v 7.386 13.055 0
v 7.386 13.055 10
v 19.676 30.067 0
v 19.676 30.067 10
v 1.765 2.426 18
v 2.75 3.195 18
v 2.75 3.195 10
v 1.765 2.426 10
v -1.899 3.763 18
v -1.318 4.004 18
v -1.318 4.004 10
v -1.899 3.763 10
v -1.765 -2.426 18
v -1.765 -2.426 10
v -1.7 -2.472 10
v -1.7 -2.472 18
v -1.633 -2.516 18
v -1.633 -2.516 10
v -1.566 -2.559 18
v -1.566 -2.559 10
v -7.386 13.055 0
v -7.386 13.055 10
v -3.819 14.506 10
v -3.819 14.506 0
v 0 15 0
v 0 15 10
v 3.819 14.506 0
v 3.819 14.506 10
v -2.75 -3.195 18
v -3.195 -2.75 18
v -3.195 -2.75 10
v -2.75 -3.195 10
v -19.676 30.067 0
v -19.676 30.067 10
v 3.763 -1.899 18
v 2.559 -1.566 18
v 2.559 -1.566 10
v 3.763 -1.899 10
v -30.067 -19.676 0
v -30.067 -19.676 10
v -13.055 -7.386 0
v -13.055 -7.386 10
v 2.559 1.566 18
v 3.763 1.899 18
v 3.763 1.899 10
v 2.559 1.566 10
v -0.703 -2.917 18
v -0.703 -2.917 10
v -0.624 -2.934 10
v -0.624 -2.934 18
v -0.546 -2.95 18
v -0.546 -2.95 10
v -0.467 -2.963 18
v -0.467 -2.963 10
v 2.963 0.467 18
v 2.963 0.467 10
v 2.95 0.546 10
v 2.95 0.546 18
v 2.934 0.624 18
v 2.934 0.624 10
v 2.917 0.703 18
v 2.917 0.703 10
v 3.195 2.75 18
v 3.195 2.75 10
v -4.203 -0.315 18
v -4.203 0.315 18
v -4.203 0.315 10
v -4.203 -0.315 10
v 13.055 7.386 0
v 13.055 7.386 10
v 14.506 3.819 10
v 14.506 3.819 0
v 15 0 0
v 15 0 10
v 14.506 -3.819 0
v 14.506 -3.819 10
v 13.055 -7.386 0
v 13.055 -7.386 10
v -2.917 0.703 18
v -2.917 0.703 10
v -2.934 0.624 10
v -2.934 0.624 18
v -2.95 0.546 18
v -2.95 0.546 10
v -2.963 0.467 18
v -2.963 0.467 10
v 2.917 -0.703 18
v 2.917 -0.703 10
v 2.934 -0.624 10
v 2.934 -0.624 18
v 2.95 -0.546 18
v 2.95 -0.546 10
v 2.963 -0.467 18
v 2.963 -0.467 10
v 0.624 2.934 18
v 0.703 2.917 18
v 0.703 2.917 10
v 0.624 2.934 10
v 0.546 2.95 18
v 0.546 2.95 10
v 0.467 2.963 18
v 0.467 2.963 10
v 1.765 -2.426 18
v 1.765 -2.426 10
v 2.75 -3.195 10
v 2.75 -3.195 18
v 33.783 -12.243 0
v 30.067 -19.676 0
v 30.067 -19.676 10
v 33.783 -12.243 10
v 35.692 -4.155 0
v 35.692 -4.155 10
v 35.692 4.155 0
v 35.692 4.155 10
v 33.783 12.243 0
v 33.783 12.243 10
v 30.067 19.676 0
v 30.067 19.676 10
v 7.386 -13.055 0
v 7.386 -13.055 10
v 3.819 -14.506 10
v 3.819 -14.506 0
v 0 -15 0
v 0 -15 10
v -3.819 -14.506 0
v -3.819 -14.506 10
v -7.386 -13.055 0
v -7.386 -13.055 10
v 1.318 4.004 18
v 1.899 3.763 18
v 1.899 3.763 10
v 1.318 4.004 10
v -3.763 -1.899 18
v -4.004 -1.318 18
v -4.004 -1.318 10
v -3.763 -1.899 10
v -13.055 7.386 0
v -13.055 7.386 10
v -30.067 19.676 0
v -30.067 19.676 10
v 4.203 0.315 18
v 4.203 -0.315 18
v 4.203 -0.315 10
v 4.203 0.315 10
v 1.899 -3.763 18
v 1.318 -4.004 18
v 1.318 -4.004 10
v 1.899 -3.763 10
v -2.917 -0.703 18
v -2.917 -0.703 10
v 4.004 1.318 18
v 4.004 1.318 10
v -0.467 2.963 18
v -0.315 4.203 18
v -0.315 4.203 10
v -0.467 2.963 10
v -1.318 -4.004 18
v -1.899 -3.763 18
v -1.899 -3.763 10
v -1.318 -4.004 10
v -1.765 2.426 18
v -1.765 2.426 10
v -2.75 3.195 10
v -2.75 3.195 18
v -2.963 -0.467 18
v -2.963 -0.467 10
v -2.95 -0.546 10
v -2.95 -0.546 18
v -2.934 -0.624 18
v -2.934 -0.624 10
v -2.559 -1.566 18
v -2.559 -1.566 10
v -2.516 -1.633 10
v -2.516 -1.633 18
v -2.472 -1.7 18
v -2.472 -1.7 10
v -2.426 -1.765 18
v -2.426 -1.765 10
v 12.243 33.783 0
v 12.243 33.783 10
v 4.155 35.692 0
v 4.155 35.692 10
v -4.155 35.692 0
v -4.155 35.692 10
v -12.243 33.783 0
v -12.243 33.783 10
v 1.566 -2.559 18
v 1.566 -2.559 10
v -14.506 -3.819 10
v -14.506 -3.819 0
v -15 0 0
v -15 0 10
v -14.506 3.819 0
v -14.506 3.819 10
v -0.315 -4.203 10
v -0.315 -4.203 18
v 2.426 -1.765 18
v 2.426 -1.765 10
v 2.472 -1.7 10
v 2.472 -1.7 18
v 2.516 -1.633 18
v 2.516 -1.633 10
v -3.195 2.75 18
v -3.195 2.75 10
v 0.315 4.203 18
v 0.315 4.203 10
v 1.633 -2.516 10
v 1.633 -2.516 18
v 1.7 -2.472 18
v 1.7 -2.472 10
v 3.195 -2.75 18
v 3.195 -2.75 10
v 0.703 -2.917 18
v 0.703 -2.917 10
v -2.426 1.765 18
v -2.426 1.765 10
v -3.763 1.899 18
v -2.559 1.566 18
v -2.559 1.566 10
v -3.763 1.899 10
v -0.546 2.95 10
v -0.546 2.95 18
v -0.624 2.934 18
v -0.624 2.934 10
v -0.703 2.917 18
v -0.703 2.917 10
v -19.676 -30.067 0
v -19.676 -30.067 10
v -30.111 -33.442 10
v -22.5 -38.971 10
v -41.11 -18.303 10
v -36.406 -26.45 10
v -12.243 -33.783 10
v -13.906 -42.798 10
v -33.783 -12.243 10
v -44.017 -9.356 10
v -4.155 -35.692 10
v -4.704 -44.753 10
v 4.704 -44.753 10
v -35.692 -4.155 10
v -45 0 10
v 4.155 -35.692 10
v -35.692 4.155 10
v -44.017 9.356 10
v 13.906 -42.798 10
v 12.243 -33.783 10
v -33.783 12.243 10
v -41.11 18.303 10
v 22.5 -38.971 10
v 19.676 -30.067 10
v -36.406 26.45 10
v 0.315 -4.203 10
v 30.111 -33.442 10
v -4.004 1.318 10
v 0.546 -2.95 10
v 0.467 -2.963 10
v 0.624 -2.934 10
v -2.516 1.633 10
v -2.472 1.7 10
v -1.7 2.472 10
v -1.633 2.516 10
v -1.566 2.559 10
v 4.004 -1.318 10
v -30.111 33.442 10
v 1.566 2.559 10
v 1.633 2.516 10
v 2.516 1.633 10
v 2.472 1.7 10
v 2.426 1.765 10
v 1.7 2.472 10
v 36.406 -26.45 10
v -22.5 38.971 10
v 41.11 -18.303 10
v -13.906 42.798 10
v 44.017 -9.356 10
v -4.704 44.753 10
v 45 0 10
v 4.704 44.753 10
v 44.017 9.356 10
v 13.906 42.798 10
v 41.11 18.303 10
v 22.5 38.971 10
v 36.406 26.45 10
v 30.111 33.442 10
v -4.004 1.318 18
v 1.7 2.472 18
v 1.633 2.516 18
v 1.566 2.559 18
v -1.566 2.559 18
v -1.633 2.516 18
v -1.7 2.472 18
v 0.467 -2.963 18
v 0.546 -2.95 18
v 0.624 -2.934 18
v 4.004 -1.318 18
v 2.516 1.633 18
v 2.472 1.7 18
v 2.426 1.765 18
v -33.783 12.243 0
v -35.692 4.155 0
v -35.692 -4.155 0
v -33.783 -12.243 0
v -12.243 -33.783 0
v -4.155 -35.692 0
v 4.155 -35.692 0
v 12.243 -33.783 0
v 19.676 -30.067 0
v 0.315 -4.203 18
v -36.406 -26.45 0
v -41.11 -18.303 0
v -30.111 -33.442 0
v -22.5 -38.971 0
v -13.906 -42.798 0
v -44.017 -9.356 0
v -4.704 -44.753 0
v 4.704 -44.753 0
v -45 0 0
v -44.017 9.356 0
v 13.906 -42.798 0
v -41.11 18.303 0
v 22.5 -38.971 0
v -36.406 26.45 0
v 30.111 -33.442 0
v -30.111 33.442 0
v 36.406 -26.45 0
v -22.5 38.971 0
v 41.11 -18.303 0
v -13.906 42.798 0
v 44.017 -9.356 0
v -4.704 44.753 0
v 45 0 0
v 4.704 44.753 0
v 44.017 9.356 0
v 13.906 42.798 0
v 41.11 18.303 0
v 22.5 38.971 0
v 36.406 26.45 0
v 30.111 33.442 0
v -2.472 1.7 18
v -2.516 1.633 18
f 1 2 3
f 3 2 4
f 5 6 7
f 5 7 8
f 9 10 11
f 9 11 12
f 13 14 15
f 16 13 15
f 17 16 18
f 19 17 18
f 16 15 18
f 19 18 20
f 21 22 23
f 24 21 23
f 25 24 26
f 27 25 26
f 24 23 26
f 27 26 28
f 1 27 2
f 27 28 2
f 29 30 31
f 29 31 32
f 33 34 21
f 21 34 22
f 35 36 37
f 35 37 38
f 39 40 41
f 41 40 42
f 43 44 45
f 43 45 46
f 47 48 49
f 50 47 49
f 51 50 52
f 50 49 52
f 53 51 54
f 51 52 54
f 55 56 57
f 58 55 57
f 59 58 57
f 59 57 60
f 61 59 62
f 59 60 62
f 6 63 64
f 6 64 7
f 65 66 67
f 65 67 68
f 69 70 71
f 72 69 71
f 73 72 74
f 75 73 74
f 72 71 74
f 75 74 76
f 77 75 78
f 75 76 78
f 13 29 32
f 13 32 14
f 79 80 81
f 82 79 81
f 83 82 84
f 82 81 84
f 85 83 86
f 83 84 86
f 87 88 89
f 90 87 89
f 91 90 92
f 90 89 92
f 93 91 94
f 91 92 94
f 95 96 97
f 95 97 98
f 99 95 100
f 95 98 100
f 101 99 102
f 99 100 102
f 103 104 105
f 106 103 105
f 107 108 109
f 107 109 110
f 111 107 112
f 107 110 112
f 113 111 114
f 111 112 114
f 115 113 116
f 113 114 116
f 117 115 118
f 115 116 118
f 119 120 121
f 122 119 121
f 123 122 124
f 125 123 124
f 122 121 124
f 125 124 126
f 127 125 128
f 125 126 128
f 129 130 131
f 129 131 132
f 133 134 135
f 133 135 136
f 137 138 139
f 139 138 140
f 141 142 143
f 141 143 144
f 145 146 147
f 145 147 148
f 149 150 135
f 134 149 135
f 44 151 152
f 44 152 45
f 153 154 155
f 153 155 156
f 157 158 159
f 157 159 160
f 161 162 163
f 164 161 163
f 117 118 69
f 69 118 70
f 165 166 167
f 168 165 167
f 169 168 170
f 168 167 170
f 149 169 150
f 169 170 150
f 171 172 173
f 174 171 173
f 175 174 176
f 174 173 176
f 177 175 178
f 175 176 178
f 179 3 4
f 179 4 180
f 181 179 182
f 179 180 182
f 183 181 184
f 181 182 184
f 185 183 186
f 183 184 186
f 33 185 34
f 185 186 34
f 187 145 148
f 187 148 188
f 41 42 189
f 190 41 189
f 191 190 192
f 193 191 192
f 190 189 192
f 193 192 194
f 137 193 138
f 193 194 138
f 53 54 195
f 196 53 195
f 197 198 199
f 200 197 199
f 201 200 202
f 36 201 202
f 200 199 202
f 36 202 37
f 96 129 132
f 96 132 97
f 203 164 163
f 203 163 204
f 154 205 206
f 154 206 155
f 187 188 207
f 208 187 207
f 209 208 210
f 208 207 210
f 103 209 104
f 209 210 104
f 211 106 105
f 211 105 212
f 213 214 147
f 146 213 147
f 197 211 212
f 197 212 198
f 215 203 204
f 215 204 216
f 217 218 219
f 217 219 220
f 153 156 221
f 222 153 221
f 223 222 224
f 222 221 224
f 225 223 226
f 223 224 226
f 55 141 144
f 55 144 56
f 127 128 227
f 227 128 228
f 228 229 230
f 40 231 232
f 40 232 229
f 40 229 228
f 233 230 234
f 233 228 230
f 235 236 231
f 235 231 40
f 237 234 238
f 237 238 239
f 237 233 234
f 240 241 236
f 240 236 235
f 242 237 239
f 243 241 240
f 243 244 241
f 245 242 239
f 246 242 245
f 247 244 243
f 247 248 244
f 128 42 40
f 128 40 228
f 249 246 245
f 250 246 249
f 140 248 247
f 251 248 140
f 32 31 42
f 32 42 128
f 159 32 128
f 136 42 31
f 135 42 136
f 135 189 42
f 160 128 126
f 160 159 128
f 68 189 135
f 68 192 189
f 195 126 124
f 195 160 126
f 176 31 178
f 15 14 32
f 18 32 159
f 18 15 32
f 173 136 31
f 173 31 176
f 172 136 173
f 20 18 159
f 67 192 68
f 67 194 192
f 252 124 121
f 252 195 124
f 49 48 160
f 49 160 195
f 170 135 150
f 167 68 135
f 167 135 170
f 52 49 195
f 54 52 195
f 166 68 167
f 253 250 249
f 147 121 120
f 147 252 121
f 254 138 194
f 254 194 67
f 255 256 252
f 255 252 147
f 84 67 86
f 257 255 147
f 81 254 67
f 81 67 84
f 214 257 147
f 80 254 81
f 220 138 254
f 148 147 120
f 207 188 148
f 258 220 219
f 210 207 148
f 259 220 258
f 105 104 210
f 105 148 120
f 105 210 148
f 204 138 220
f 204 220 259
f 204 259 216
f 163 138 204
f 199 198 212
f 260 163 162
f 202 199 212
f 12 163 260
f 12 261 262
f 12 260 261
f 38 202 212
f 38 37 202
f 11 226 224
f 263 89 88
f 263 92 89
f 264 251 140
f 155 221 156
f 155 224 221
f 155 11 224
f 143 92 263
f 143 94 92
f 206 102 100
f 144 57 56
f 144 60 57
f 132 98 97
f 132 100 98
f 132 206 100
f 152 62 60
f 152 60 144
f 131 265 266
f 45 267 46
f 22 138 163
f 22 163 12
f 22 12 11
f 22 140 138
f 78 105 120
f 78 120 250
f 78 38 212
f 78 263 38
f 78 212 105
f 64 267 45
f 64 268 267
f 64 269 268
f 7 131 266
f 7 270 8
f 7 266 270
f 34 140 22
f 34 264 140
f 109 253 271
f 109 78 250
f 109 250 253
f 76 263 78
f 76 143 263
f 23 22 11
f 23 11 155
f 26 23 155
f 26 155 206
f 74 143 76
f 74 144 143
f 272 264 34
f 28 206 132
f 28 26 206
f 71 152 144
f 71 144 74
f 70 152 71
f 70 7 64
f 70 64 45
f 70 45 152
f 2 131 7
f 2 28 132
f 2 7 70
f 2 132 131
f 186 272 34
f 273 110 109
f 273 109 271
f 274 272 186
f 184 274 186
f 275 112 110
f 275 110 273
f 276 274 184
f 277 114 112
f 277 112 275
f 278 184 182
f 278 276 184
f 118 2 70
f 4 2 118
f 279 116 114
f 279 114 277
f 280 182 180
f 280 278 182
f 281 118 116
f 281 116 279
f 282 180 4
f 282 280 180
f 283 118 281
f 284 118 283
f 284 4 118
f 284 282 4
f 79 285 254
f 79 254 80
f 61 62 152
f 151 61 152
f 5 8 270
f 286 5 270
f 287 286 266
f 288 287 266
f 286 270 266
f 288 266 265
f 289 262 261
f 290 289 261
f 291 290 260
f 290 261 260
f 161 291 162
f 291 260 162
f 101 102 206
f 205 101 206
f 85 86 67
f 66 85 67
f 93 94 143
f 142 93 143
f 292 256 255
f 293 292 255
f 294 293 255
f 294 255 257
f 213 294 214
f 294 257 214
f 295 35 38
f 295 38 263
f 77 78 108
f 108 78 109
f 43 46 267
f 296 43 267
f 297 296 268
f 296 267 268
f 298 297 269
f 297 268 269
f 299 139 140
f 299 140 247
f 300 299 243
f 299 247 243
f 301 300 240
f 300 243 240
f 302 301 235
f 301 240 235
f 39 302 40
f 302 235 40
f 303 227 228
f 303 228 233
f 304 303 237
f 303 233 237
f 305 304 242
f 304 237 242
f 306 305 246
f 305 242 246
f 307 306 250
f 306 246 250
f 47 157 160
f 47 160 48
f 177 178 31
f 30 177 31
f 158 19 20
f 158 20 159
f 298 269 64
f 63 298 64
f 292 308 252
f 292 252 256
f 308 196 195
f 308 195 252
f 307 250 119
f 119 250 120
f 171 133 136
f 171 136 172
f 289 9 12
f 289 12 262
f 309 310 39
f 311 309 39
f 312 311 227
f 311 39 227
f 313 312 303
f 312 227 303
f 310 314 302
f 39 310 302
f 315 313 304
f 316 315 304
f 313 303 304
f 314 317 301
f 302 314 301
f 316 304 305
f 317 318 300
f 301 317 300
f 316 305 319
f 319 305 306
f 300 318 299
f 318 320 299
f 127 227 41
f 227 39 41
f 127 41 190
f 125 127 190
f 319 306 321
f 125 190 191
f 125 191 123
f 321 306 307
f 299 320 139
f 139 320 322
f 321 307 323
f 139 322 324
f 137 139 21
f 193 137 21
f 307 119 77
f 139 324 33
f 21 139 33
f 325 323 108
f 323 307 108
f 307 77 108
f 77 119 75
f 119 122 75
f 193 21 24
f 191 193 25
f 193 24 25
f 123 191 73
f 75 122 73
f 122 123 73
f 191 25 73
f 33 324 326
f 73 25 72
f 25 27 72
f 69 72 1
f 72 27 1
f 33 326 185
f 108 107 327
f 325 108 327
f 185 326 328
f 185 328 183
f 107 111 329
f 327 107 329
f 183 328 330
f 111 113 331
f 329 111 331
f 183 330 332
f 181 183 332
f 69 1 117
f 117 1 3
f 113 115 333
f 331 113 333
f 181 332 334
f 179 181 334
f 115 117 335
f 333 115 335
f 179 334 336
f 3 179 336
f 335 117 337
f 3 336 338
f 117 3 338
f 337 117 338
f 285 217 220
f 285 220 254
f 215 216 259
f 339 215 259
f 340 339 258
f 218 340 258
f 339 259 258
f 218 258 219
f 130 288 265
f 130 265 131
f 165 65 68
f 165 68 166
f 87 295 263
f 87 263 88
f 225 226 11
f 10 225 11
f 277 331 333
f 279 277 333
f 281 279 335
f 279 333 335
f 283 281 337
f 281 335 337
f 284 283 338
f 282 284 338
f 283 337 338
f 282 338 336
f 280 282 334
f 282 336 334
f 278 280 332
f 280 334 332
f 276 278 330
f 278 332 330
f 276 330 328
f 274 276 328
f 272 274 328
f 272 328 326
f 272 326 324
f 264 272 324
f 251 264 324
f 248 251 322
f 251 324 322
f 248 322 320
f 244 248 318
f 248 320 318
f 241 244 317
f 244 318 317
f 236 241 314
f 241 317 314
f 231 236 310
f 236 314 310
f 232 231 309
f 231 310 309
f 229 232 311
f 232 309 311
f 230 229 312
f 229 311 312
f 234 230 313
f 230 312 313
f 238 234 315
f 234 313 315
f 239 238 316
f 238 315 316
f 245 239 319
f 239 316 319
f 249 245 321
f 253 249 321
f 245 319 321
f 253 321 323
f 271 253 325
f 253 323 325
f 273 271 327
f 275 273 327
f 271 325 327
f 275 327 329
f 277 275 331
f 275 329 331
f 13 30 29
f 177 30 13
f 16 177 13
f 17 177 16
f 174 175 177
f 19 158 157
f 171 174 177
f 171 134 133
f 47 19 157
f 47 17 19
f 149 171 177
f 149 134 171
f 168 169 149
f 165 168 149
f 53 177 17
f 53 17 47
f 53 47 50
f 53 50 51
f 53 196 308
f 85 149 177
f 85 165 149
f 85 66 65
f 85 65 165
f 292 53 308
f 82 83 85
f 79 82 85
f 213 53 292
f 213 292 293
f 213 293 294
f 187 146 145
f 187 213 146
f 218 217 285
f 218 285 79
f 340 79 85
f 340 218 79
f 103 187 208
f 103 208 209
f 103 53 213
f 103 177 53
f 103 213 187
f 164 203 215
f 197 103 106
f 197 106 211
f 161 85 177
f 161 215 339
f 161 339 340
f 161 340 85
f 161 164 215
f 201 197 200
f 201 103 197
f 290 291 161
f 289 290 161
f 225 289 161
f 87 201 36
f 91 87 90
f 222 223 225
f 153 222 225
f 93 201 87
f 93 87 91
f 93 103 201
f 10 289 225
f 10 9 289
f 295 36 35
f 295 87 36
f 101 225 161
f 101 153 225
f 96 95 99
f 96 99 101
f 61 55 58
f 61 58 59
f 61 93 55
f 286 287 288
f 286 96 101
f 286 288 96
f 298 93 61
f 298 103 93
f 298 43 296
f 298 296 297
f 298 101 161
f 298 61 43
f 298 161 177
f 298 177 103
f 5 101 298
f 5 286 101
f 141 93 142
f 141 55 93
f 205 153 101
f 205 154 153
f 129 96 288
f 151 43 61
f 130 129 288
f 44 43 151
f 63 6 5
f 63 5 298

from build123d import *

# Parameters (mm, degrees)
ESBO_O1_R                = 45
RESSALTO_EXTRUS_O1_DEPTH = 10
CORTE_EXTRUS_O1_DEPTH    = 10
PADR_OCIRCULAR1_COUNT    = 4
ESBO_O3_R                = 3
RESSALTO_EXTRUS_O2_DEPTH = 8
RESSALTO_EXTRUS_O3_DEPTH = 8
PADR_OCIRCULAR2_COUNT    = 16


with BuildPart() as part:
    # Esboço1 → Ressalto-extrusão1 (new body)
    with BuildSketch(Plane.XY):
        Circle(ESBO_O1_R)
    extrude(amount=RESSALTO_EXTRUS_O1_DEPTH)

    # Esboço2 → Corte-extrusão1 (cut)
    with BuildSketch(Plane.XY.offset(10)):
        with BuildLine():
            Line((-19.67582712, 30.066816509), (-7.386402319, 13.055307763))
            ThreePointArc((-7.386402319, 13.055307763), (0, 15), (7.386402319, 13.055307763))
            Line((7.386402319, 13.055307763), (19.67582712, 30.066816509))
            ThreePointArc((19.67582712, 30.066816509), (0, 35.932598401), (-19.67582712, 30.066816509))
        make_face()
    corte_extrus_o1 = extrude(amount=-CORTE_EXTRUS_O1_DEPTH, mode=Mode.SUBTRACT)

    # PadrãoCircular1: Corte-extrusão1 ×4 about axis
    padr_ocircular1_axis = Axis((0, 0, 0), (0, 0, 1))
    for i in range(1, PADR_OCIRCULAR1_COUNT):
        add(corte_extrus_o1.rotate(padr_ocircular1_axis, i * 360 / PADR_OCIRCULAR1_COUNT), mode=Mode.SUBTRACT)

    # Esboço3 → Ressalto-extrusão2 (add)
    with BuildSketch(Plane.XY.offset(10)):
        Circle(ESBO_O3_R)
    extrude(amount=RESSALTO_EXTRUS_O2_DEPTH)

    # Esboço4 → Ressalto-extrusão3 (add)
    with BuildSketch(Plane.XY.offset(18)):
        Polygon((-0.5, 2.695095519), (0.5, 2.695095519), (0.314812798, 4.203324244), (-0.314812798, 4.203324244), align=None)
    ressalto_extrus_o3 = extrude(amount=-RESSALTO_EXTRUS_O3_DEPTH)

    # PadrãoCircular2: Ressalto-extrusão3 ×16 about axis
    padr_ocircular2_axis = Axis((0, 0, 0), (0, 0, 1))
    for i in range(1, PADR_OCIRCULAR2_COUNT):
        add(ressalto_extrus_o3.rotate(padr_ocircular2_axis, i * 360 / PADR_OCIRCULAR2_COUNT))


solid = part.part
